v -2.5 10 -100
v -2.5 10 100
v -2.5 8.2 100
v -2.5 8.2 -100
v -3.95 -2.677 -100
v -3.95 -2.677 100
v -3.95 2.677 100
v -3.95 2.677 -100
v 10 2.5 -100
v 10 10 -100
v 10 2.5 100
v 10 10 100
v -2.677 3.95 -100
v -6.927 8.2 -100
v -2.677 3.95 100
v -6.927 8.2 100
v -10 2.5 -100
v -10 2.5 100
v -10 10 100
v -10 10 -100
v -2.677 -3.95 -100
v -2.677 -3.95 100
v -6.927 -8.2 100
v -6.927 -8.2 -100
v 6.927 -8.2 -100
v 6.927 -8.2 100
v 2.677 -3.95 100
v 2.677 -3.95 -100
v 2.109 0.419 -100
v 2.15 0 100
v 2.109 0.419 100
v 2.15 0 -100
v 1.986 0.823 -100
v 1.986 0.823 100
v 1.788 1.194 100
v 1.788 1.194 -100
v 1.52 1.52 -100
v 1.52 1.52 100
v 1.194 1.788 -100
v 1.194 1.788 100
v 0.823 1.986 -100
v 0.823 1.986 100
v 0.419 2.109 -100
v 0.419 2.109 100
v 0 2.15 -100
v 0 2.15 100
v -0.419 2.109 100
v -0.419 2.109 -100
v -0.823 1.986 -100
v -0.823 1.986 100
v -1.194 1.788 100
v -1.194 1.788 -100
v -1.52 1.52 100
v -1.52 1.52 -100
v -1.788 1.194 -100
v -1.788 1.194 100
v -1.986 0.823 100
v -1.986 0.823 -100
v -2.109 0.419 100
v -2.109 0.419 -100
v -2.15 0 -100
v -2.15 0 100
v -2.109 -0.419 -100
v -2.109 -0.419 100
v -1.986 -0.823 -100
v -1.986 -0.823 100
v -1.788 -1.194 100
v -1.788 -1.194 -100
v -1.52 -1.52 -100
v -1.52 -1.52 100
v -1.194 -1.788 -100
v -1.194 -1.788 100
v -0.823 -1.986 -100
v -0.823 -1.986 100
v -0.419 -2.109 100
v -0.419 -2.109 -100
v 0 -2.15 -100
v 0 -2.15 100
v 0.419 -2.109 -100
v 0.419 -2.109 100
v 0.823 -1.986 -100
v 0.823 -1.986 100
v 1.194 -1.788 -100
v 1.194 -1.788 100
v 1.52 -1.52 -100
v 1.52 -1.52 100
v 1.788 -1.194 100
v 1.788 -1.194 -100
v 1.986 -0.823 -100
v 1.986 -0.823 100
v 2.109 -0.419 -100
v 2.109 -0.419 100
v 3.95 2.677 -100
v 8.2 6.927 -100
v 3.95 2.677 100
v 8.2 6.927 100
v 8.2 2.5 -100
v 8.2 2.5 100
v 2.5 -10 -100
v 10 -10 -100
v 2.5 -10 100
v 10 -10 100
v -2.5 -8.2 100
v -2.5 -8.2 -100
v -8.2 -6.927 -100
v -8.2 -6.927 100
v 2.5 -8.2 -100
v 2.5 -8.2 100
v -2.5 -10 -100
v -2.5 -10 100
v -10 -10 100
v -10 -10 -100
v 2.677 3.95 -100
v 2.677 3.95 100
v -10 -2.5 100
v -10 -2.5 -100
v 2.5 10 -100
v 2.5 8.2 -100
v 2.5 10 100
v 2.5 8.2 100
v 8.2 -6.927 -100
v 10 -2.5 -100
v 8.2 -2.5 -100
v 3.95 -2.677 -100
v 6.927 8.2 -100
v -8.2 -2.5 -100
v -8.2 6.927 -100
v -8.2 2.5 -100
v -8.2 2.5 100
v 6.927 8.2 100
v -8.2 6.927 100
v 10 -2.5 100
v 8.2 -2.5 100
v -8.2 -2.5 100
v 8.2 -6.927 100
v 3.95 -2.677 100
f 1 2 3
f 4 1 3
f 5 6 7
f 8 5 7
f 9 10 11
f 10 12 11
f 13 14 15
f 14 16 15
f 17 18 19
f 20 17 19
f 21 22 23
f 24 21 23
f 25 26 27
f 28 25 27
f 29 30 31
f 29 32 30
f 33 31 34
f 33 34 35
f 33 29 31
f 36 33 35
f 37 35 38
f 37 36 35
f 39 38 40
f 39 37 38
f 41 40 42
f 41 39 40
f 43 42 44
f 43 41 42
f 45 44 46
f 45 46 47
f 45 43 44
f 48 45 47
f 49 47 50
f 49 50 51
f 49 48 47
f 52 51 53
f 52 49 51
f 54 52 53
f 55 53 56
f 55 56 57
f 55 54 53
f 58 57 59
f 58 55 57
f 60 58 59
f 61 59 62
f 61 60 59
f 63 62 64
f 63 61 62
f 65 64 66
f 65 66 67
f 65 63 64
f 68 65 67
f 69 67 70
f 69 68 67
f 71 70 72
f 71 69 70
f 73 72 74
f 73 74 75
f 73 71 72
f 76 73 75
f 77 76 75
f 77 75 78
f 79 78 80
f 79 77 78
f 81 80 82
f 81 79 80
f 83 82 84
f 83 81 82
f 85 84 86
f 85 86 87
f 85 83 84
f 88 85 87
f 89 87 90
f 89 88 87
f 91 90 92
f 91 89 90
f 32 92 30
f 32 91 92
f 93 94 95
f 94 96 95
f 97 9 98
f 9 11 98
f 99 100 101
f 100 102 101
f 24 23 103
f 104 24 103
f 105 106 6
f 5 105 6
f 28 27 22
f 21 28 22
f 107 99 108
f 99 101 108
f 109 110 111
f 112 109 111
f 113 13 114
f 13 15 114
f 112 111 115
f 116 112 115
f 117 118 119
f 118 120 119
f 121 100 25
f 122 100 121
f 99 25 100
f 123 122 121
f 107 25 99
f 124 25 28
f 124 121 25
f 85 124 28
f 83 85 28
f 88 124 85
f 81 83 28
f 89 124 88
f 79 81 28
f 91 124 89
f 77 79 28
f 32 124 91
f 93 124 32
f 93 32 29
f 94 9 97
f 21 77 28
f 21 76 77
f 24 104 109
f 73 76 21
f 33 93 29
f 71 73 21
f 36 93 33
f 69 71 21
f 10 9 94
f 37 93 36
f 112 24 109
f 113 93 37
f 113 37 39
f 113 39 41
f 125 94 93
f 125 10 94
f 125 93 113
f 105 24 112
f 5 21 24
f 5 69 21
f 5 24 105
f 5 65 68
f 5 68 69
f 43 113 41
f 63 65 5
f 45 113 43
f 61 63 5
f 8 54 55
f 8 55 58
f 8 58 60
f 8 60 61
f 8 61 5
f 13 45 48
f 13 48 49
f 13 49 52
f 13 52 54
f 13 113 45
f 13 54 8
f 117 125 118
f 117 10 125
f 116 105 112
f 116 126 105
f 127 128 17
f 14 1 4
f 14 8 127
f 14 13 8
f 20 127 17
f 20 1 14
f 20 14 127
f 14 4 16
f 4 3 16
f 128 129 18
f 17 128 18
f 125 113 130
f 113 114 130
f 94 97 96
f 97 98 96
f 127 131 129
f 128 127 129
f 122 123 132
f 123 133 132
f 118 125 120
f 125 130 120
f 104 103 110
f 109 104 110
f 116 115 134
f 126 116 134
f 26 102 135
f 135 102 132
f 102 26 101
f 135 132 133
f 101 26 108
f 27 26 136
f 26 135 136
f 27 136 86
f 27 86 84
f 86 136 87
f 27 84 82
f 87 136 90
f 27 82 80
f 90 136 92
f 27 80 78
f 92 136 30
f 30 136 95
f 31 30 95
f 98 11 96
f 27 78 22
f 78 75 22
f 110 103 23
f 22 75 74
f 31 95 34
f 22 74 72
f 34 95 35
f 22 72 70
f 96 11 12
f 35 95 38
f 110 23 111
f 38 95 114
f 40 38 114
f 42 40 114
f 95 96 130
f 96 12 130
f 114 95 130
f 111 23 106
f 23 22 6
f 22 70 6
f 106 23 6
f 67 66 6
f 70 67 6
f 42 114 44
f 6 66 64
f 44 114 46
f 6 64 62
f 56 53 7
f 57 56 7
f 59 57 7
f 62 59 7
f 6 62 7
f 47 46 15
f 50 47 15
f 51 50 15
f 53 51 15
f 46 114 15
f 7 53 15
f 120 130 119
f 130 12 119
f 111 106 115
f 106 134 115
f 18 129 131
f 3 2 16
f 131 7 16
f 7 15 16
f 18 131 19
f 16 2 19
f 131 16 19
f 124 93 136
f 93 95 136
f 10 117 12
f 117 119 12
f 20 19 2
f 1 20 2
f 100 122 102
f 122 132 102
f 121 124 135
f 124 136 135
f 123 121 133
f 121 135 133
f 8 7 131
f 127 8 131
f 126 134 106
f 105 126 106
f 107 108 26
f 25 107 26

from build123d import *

# Parameters (mm, degrees)
SKETCH2_R           = 2.15
BOSS_EXTRUDE1_DEPTH = 100


with BuildPart() as part:
    # Sketch2 → Boss-Extrude1 (new body, symmetric)
    with BuildSketch(Plane.XY):
        Polygon((-2.5, 10), (-2.5, 8.2), (-6.927207794, 8.2), (-2.677207794, 3.95), (2.677207794, 3.95), (6.927207794, 8.2), (2.5, 8.2), (2.5, 10), (10, 10), (10, 2.5), (8.2, 2.5), (8.2, 6.927207794), (3.95, 2.677207794), (3.95, -2.677207794), (8.2, -6.927207794), (8.2, -2.5), (10, -2.5), (10, -10), (2.5, -10), (2.5, -8.2), (6.927207794, -8.2), (2.677207794, -3.95), (-2.677207794, -3.95), (-6.927207794, -8.2), (-2.5, -8.2), (-2.5, -10), (-10, -10), (-10, -2.5), (-8.2, -2.5), (-8.2, -6.927207794), (-3.95, -2.677207794), (-3.95, 2.677207794), (-8.2, 6.927207794), (-8.2, 2.5), (-10, 2.5), (-10, 10), align=None)
        Circle(SKETCH2_R, mode=Mode.SUBTRACT)
    extrude(amount=BOSS_EXTRUDE1_DEPTH, both=True)


solid = part.part
